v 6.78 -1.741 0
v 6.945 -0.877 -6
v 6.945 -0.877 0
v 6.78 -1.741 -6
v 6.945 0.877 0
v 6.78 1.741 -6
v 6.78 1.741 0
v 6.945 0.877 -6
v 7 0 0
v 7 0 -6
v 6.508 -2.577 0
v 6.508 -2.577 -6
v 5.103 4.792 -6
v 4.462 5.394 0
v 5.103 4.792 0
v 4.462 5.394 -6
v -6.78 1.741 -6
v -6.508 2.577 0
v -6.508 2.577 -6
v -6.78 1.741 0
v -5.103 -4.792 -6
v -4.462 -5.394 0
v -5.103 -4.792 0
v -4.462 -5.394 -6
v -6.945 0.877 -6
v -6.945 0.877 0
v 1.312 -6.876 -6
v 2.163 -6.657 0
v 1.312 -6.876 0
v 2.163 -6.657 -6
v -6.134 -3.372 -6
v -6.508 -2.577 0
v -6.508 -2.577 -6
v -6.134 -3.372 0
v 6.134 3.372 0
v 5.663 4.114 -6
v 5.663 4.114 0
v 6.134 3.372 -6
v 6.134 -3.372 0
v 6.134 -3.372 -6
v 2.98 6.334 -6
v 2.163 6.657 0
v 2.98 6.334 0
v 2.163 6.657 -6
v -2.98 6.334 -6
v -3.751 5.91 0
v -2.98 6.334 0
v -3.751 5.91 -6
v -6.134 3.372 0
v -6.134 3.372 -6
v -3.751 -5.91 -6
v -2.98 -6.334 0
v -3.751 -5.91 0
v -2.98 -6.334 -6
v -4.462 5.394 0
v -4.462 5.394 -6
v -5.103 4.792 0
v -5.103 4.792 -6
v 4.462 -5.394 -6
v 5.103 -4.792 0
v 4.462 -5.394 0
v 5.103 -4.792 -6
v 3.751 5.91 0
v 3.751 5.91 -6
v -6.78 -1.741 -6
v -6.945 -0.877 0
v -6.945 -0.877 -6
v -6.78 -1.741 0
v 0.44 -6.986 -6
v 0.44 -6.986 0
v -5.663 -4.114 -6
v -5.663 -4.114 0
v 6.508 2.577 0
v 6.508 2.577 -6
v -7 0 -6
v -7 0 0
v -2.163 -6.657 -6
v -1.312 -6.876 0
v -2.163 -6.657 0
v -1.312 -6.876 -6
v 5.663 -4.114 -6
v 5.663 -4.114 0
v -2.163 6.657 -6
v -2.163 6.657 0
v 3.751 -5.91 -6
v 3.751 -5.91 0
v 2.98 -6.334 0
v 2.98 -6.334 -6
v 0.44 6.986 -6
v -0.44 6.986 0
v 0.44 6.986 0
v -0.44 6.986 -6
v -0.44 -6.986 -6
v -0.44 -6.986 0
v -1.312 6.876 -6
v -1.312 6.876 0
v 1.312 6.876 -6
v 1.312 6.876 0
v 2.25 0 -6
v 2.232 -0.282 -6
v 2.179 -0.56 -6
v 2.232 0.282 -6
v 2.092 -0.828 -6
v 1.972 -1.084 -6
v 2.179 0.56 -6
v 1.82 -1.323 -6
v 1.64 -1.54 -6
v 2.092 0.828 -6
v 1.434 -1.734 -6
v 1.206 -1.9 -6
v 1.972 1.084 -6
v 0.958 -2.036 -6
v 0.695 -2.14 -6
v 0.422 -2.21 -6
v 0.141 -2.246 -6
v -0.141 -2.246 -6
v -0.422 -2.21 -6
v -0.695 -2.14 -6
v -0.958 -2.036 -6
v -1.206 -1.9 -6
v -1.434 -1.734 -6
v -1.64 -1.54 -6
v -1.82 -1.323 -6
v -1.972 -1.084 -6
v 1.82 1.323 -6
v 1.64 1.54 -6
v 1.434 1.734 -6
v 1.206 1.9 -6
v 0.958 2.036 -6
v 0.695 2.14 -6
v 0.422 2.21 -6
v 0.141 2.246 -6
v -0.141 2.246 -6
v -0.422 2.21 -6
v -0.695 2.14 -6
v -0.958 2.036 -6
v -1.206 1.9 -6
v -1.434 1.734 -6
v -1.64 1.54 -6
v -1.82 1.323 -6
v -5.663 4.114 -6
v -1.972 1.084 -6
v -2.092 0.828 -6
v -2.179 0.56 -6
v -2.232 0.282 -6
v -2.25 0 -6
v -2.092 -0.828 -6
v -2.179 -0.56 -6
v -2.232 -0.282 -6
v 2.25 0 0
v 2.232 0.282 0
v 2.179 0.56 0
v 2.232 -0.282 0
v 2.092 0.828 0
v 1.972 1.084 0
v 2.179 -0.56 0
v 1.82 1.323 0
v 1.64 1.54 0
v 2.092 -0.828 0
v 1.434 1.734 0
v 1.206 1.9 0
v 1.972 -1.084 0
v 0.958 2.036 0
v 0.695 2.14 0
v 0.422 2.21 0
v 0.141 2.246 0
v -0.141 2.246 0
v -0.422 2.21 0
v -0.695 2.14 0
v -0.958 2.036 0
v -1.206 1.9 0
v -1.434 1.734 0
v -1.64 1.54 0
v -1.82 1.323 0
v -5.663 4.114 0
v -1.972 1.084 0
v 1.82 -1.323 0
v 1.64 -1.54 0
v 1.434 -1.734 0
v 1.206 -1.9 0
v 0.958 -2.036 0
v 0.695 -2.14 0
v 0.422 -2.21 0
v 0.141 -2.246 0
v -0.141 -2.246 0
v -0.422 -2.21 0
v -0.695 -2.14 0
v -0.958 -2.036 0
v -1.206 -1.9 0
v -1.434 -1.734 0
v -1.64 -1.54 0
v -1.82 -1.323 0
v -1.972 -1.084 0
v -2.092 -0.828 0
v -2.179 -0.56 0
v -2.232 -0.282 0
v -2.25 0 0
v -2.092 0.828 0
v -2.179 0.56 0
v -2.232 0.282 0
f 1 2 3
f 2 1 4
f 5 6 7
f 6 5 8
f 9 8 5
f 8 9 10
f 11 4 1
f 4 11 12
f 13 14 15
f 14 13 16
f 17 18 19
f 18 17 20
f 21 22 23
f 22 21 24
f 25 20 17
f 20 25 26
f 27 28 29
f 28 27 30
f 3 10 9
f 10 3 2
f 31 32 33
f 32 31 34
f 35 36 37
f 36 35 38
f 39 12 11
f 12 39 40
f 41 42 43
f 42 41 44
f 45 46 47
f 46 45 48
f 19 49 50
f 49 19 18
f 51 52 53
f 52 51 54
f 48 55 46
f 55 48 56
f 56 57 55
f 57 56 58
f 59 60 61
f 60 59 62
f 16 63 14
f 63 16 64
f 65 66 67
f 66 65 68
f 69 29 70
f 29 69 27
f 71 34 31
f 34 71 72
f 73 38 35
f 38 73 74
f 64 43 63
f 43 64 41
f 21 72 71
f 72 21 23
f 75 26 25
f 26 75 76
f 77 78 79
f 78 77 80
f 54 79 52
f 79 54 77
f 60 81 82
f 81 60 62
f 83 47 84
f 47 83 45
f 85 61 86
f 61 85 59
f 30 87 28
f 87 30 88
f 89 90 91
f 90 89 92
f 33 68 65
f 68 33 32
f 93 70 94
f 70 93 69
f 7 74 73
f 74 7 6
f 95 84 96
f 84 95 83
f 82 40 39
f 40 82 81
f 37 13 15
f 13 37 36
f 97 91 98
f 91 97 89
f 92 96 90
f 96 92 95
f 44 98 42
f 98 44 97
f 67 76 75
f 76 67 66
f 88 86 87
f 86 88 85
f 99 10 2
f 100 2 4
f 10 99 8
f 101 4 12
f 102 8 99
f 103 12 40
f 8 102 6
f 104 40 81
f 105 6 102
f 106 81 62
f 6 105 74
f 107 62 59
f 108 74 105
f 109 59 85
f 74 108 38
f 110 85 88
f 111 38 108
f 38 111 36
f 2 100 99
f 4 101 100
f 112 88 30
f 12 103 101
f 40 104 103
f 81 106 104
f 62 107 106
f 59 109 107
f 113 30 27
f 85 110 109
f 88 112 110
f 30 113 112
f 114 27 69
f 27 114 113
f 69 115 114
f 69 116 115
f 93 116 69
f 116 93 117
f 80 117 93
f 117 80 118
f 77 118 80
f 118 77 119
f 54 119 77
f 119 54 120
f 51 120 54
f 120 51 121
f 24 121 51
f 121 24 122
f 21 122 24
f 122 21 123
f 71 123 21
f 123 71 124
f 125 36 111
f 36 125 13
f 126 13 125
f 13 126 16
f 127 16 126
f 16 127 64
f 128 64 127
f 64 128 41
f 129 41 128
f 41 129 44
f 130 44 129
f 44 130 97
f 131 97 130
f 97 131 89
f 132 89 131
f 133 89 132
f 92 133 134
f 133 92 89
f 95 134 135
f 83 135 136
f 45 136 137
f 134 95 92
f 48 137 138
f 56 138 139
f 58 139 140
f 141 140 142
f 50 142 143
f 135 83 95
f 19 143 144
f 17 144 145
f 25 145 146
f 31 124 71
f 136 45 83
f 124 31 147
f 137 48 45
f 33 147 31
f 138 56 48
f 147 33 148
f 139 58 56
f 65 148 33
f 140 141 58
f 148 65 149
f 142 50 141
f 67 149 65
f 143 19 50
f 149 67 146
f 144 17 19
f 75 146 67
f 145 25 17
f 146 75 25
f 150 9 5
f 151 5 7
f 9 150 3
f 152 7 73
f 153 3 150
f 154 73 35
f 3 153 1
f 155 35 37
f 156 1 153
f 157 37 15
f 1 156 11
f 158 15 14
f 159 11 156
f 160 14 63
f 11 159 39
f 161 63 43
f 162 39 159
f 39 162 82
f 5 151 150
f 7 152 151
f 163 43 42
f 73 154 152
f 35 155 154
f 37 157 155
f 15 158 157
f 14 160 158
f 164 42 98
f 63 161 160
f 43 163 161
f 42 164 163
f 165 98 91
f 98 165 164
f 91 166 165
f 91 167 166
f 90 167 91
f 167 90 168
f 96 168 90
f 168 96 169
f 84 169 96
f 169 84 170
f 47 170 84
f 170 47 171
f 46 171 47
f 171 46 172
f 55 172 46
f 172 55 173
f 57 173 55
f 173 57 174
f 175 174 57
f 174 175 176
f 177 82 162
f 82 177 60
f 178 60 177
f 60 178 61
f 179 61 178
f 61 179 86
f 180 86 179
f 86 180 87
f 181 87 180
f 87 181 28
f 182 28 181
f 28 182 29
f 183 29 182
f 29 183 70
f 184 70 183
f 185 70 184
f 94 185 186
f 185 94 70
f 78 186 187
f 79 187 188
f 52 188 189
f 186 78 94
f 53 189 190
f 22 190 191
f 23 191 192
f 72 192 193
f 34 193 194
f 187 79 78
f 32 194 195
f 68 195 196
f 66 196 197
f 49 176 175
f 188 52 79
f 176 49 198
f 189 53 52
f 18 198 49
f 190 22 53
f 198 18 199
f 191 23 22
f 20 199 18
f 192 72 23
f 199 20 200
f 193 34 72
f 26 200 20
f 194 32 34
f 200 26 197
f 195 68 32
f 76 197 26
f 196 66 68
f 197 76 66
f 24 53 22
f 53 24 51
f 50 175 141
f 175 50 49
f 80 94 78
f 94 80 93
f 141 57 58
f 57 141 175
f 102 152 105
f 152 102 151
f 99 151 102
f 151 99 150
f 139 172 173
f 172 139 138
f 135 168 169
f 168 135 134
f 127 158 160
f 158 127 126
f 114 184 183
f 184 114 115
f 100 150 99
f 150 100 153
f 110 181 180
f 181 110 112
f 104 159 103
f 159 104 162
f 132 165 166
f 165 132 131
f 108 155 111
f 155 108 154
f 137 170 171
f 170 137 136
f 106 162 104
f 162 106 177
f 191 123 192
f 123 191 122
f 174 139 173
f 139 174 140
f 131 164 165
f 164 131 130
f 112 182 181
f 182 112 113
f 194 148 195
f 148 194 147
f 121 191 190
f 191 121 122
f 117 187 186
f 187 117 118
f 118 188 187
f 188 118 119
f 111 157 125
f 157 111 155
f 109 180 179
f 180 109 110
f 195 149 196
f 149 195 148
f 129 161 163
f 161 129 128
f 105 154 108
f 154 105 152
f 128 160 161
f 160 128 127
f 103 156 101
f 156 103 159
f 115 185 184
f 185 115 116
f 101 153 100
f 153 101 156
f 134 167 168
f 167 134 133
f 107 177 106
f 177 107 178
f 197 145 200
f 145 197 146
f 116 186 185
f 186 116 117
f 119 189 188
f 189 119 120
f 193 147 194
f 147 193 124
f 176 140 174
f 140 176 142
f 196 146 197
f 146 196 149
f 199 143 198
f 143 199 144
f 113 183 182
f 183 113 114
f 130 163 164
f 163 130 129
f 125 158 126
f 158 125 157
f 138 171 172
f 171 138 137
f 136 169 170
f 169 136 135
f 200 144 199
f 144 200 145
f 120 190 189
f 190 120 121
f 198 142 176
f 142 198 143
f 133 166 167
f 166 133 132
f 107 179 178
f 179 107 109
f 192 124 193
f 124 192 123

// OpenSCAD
$fn = 50;


difference() {
	union() {
		translate(v = [0, 0, -6.0000000000]) {
			cylinder(h = 6, r = 7.0000000000);
		}
		cylinder(h = 0, r = 10.0000000000);
	}
	union() {
		#translate(v = [0, 0, -6]) {
			cylinder(h = 6, r = 2.2500000000);
		}
	}
}
